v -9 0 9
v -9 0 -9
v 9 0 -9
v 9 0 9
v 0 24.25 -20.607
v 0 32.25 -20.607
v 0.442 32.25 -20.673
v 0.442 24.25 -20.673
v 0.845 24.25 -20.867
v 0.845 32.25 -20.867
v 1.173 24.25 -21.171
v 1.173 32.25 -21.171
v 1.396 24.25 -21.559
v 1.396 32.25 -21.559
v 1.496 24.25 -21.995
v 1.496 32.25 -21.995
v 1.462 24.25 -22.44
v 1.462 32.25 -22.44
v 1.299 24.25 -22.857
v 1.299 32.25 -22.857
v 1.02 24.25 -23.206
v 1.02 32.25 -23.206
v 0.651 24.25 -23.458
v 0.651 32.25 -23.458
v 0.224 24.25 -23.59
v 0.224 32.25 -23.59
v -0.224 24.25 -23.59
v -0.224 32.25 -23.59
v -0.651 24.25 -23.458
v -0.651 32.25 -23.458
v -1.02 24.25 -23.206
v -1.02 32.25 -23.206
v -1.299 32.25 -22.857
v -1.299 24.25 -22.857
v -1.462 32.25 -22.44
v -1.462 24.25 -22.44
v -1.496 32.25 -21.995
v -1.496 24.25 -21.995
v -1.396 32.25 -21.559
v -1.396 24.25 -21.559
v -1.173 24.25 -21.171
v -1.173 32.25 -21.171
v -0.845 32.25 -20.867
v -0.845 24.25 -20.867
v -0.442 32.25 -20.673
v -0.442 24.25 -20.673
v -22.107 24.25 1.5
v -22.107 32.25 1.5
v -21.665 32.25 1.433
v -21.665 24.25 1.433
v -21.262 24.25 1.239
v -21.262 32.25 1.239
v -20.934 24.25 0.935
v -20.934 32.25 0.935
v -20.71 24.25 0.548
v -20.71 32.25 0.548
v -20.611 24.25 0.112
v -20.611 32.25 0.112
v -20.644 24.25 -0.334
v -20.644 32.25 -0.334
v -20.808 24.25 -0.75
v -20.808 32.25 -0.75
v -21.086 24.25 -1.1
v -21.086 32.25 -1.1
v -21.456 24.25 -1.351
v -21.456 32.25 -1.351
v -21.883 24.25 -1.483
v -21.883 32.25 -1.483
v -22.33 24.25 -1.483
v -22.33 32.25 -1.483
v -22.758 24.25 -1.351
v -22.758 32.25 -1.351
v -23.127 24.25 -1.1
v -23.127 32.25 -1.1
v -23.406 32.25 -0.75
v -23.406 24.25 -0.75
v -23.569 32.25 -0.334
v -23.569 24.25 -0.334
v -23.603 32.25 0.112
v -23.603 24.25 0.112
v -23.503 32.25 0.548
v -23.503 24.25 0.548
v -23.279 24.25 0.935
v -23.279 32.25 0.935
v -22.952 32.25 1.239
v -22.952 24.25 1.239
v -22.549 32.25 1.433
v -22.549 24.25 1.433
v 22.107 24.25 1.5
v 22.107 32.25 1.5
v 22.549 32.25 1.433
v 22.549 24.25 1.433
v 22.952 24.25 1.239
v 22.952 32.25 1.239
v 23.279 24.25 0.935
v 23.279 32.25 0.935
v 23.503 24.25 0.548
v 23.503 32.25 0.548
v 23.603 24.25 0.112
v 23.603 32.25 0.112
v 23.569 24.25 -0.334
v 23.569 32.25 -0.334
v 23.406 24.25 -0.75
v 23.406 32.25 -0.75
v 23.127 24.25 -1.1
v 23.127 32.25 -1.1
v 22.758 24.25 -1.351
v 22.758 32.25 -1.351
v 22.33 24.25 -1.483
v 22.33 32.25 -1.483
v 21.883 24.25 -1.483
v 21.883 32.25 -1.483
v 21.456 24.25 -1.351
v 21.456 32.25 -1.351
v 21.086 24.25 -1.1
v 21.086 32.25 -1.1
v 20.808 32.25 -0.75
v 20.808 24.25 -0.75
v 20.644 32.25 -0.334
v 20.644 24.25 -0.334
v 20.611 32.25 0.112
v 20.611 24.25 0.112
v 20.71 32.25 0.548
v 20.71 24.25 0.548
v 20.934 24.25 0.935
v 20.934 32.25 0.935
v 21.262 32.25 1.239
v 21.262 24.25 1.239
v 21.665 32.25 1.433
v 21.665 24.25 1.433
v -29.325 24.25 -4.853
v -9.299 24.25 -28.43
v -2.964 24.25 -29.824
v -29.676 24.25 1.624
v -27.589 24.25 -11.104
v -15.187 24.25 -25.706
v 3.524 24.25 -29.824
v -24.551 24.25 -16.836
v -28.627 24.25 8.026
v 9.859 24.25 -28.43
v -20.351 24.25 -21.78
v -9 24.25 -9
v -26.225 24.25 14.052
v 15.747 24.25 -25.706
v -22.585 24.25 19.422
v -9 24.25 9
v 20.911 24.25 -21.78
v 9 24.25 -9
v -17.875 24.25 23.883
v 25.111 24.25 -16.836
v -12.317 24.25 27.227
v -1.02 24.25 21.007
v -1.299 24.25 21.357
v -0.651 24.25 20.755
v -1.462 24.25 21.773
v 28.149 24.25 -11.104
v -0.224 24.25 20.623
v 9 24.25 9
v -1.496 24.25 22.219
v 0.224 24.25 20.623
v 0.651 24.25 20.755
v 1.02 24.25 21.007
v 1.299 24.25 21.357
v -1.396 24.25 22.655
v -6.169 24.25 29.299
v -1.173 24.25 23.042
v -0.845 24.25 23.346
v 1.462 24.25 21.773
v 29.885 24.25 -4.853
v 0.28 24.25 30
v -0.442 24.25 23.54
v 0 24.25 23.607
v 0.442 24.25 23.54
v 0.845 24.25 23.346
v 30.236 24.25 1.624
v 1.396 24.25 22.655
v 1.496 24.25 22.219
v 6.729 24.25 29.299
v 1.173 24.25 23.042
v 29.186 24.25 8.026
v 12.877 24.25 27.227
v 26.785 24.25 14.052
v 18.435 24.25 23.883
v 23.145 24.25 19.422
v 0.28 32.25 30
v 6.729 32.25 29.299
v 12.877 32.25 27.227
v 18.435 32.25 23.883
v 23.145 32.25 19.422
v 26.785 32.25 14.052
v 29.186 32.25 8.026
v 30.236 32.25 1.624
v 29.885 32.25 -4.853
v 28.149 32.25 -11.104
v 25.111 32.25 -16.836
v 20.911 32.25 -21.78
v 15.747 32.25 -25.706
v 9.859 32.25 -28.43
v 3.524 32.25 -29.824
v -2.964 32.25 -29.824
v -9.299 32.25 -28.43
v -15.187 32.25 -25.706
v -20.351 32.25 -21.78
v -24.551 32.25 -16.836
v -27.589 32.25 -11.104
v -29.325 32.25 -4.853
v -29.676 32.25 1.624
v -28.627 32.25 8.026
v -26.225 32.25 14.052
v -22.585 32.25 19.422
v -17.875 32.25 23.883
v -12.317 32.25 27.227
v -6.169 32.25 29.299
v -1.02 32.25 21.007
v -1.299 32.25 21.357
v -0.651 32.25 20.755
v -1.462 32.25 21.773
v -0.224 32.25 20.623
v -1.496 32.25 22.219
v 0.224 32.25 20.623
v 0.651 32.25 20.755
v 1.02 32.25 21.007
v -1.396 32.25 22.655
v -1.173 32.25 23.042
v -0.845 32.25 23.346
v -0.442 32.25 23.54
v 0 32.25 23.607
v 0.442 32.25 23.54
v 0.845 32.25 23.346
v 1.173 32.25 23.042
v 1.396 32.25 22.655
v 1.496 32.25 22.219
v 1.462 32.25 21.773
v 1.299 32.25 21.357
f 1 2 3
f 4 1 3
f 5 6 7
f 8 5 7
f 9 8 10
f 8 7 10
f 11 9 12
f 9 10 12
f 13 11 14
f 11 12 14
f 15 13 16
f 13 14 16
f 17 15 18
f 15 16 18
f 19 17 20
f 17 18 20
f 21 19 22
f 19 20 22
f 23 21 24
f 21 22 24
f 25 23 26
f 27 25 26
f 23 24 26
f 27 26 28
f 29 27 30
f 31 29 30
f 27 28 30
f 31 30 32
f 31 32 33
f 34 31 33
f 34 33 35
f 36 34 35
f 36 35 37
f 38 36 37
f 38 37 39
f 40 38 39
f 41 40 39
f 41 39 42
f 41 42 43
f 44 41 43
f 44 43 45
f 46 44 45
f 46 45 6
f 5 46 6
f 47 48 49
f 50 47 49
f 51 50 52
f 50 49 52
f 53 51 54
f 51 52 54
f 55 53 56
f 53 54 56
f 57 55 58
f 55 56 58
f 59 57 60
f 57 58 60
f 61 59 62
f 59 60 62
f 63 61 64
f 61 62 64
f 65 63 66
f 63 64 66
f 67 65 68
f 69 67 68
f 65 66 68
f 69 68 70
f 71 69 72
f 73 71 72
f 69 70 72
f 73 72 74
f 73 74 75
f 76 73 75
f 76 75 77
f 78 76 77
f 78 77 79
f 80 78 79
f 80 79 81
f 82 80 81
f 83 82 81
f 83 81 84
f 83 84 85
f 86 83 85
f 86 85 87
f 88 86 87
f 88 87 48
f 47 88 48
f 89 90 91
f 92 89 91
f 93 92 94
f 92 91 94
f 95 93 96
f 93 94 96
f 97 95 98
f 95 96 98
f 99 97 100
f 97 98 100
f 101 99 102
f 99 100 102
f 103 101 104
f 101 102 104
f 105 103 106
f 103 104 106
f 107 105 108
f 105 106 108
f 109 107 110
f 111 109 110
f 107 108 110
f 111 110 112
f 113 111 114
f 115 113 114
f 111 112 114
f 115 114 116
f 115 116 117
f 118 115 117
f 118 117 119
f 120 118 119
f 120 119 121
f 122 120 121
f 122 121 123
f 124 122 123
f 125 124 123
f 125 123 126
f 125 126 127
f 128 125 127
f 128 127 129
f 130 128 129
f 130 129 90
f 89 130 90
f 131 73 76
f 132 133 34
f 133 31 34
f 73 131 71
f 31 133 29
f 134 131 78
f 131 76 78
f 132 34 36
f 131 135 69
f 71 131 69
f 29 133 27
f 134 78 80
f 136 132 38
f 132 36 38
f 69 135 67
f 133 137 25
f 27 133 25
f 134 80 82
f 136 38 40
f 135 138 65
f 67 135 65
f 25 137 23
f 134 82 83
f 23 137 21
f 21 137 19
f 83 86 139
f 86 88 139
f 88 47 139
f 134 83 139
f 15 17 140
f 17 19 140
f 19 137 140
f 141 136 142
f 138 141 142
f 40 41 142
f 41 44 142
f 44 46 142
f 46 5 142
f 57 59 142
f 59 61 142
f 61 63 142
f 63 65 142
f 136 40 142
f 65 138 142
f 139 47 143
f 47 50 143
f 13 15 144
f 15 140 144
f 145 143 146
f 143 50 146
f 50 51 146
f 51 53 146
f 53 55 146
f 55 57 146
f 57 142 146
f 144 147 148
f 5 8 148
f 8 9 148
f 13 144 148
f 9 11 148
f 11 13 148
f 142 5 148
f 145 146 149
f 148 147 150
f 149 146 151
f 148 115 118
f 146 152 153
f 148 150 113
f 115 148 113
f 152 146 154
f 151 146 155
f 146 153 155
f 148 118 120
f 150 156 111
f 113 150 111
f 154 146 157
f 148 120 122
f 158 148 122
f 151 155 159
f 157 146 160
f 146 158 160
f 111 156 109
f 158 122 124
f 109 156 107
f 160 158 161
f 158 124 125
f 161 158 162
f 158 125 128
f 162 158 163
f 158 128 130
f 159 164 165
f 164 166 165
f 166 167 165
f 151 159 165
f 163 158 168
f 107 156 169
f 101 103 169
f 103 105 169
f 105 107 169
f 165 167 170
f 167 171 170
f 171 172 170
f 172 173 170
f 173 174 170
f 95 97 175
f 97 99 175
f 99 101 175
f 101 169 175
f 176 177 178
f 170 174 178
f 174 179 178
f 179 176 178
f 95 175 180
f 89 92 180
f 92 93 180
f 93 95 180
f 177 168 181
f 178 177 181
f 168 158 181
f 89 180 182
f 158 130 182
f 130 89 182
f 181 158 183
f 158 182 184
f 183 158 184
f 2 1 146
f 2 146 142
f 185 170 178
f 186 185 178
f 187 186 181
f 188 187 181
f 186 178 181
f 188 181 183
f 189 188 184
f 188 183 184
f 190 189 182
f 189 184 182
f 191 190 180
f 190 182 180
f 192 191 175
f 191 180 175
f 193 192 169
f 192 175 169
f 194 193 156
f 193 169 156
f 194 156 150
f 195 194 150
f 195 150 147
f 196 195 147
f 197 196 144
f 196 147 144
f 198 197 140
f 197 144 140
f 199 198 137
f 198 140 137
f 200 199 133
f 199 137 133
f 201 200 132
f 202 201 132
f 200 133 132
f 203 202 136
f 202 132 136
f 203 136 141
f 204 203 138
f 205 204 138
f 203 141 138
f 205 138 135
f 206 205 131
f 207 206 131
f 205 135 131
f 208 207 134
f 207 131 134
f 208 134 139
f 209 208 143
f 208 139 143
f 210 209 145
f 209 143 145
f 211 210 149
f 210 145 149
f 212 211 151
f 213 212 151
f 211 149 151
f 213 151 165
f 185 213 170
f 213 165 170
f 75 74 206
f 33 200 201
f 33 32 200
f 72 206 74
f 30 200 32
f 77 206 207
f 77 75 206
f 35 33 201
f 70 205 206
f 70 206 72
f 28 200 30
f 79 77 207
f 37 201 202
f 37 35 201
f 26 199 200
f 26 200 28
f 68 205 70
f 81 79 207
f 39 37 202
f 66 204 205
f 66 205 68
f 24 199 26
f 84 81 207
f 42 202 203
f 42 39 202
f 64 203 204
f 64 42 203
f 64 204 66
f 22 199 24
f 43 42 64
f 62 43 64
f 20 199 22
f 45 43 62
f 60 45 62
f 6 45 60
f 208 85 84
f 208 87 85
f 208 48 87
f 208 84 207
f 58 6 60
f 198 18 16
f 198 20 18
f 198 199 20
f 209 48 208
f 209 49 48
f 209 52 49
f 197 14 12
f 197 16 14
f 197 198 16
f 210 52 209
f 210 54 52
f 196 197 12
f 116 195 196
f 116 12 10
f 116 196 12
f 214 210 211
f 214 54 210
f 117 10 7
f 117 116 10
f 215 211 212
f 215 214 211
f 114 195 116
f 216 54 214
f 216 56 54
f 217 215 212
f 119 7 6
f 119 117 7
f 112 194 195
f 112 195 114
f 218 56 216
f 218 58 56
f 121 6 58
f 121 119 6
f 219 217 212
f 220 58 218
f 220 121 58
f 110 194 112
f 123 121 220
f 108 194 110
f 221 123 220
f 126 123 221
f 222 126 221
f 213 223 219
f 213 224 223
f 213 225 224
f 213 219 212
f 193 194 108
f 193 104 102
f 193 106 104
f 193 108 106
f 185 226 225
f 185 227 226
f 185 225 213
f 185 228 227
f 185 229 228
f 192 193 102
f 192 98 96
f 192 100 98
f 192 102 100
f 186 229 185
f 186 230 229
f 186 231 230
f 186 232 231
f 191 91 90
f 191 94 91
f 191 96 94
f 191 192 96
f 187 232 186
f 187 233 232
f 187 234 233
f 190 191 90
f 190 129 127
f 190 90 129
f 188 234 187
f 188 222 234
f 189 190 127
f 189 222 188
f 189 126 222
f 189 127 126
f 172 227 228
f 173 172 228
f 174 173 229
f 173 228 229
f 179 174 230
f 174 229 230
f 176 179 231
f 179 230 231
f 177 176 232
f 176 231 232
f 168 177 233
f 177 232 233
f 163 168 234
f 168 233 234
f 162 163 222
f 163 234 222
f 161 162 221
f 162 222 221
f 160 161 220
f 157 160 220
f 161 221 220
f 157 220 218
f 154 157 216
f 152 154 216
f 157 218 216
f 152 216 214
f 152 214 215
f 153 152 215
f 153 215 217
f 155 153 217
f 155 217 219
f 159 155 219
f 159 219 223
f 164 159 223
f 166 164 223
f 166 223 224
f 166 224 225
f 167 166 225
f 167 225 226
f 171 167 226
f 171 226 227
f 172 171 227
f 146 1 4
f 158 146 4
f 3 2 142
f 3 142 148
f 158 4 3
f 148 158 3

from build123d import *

# Parameters (mm, degrees)
SKETCH1_W           = 18
SKETCH1_H           = 18
BOSS_EXTRUDE1_DEPTH = 24.25
SKETCH2_R           = 30
BOSS_EXTRUDE2_DEPTH = 8
SKETCH3_R           = 1.5
CUT_EXTRUDE1_DEPTH  = 12


with BuildPart() as part:
    # Sketch1 → Boss-Extrude1 (new body)
    with BuildSketch(Plane(origin=(0, 0, 0), x_dir=(1, 0, 0), z_dir=(0, 1, 0))):
        Rectangle(SKETCH1_W, SKETCH1_H)
    extrude(amount=BOSS_EXTRUDE1_DEPTH)

    # Sketch2 → Boss-Extrude2 (add)
    with BuildSketch(Plane(origin=(0, 24.25, 0), x_dir=(1, 0, 0), z_dir=(0, 1, 0))):
        with Locations(Location((0.279992144, 0, 0), (0, 0, 270))):
            Circle(SKETCH2_R)
    extrude(amount=BOSS_EXTRUDE2_DEPTH)

    # Sketch3 → Cut-Extrude1 (cut)
    with BuildSketch(Plane(origin=(0, 32.25, 0), x_dir=(1, 0, 0), z_dir=(0, 1, 0))):
        with Locations(Location((0, 22.106714755, 0), (0, 0, 270))):
            Circle(SKETCH3_R)
        with Locations(Location((22.106714755, 0, 0), (0, 0, 270))):
            Circle(SKETCH3_R)
        with Locations(Location((0, -22.106714755, 0), (0, 0, 270))):
            Circle(SKETCH3_R)
        with Locations(Location((-22.106714755, 0, 0), (0, 0, 270))):
            Circle(SKETCH3_R)
    extrude(amount=-CUT_EXTRUDE1_DEPTH, mode=Mode.SUBTRACT)


solid = part.part
